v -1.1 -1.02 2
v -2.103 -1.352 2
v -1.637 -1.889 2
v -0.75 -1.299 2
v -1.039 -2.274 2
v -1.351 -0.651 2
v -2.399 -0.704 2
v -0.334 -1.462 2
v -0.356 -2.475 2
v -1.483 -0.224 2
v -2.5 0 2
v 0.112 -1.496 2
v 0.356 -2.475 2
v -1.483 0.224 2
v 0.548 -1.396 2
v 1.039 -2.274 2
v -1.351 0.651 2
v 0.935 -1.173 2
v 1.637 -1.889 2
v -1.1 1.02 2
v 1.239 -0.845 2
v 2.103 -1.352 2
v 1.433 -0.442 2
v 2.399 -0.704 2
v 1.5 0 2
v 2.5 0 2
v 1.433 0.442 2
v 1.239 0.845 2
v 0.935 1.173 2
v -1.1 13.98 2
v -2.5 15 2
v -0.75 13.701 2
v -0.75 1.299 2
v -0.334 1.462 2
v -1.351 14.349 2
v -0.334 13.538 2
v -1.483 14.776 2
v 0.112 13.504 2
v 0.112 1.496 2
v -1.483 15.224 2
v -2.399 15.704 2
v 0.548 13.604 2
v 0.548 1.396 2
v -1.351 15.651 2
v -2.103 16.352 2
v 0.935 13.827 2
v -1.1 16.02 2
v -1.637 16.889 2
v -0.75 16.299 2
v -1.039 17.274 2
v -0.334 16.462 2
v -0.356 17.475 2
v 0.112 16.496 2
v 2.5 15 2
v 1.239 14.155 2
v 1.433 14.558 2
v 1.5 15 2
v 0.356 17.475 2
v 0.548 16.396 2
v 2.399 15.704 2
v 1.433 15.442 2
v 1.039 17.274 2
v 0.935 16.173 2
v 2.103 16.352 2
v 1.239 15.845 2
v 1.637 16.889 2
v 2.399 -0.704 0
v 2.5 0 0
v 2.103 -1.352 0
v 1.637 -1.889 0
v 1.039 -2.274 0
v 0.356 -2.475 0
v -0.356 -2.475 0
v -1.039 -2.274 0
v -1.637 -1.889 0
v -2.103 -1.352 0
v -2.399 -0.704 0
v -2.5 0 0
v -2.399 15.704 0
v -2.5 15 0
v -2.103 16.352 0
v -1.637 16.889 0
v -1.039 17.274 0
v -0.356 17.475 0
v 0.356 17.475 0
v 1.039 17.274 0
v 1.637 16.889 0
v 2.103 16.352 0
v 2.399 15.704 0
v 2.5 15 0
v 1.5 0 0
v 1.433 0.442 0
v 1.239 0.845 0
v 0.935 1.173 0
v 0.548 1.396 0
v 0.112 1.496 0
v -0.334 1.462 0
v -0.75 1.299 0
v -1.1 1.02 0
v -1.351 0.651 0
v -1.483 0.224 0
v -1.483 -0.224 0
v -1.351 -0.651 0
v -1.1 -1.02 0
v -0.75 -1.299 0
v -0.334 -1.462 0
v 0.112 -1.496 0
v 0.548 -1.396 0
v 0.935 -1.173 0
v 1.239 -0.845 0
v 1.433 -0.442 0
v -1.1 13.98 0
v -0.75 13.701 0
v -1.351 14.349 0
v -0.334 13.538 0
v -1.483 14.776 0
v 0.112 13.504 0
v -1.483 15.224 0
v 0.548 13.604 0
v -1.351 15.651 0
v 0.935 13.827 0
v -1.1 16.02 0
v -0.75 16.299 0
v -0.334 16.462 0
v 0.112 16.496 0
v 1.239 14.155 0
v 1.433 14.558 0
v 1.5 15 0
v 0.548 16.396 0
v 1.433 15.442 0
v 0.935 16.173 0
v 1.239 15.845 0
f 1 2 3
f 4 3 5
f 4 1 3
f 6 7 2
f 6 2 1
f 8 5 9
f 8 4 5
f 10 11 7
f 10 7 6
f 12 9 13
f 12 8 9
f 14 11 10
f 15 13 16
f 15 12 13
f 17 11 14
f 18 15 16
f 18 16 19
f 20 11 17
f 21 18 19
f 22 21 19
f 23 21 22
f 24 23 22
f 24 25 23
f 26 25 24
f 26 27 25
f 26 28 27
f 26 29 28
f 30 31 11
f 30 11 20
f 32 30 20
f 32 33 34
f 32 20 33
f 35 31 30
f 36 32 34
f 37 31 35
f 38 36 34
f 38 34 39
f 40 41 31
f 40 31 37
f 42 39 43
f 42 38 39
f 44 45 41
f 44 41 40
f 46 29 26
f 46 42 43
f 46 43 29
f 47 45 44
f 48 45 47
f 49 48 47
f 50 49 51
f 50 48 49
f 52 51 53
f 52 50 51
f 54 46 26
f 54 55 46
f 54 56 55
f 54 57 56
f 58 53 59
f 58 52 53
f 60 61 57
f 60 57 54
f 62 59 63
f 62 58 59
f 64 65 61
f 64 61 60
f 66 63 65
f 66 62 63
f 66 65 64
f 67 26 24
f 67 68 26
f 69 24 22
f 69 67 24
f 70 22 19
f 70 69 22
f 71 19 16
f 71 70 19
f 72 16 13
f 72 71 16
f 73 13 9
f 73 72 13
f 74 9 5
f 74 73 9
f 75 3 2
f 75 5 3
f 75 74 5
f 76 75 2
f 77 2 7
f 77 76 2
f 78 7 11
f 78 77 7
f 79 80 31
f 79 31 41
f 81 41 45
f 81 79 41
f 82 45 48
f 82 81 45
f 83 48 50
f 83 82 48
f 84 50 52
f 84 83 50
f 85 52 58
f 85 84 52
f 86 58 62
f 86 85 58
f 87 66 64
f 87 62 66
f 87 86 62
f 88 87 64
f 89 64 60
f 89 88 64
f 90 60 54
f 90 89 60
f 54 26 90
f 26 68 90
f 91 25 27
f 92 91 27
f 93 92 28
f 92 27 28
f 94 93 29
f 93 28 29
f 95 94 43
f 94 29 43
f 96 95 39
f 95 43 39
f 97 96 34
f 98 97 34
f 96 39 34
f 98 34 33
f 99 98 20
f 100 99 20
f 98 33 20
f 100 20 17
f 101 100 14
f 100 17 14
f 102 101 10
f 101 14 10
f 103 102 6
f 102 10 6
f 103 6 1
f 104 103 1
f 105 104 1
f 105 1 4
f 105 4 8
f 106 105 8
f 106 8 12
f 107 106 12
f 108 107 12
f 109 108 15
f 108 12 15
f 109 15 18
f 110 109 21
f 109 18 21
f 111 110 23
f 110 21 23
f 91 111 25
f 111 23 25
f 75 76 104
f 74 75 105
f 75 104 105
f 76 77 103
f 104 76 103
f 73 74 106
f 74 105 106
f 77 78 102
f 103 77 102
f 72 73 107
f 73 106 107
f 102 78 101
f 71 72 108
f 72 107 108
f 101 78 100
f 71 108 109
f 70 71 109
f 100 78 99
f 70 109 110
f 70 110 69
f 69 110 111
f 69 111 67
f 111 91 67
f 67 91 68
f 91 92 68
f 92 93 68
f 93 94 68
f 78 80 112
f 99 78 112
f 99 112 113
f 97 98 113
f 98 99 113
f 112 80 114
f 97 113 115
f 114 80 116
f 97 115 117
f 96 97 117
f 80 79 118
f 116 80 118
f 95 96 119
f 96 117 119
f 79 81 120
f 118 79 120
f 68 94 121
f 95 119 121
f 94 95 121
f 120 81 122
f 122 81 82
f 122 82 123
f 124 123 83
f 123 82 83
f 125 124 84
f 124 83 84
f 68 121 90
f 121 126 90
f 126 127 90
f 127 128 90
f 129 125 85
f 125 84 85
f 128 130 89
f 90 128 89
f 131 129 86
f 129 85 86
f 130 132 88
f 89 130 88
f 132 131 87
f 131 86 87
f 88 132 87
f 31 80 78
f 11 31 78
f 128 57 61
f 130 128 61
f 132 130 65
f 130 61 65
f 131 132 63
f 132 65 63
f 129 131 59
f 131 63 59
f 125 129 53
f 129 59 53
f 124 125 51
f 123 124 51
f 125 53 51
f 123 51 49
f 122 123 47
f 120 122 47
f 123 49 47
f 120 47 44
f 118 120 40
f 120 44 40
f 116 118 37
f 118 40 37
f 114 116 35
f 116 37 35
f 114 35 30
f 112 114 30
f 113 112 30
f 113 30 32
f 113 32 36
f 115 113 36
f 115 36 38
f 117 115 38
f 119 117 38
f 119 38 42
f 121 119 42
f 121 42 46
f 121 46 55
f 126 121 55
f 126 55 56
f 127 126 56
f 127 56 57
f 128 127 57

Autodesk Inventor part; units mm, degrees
ref_plane "YZ Plane" through (0, 0, 0) normal (1, 0, 0) x (0, 1, 0)
ref_plane "XZ Plane" through (0, 0, 0) normal (0, 1, 0) x (-1, 0, 0)
ref_plane "XY Plane" through (0, 0, 0) normal (0, 0, 1) x (1, 0, 0)
sketch "草图1" plane through (0, 0, 0) normal (0, 0, 1) x (1, 0, 0)
  line L0 (0, 0) -> (0, 15) construction
  line L1 (2.5, 0) -> (2.5, 15)
  line L2 (-2.5, 15) -> (-2.5, 0)
  arc A0 (-2.5, 0) -> (2.5, 0) centre (0, 0) ccw
  arc A1 (2.5, 15) -> (-2.5, 15) centre (0, 15) ccw
  point P0 (0, 7.5)
  point P1 (0, -2.5)
  point P2 (0, 17.5)
  dimension "d2" = 20
  dimension "d3" = 5
extrude "拉伸1" add sketch "草图1" along normal blind 2
sketch "草图2" plane through (0, 0, 2) normal (0, 0, 1) x (1, 0, 0)
  circle A0 centre (0, 0) radius 1.5
  arc A1 (2.5, 15) -> (-2.5, 15) centre (0, 15) ccw projected
  circle A2 centre (0, 15) radius 1.5
  dimension "d4" = 3
  dimension "d5" = 3
extrude "拉伸2" cut sketch "草图2" against normal blind 3
properties part number "连杆2"
